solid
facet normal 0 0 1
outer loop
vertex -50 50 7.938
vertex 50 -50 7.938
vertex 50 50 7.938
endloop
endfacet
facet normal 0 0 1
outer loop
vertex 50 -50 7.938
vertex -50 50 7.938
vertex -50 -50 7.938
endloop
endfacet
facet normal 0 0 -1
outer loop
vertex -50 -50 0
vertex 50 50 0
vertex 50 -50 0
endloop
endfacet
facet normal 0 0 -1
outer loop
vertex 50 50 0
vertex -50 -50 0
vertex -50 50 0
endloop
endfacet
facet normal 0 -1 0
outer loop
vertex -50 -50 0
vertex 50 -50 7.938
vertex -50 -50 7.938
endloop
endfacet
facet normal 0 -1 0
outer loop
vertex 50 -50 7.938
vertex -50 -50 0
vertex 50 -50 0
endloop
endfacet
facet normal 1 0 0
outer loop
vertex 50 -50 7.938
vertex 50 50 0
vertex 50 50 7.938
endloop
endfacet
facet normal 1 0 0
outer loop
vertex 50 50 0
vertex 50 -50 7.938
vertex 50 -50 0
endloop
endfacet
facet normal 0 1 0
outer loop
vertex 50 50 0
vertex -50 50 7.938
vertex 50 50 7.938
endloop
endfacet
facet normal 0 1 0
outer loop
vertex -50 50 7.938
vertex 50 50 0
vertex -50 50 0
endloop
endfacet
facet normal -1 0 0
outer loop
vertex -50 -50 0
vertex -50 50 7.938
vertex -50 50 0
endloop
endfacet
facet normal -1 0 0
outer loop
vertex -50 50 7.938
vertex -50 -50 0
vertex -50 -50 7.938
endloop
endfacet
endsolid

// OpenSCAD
// Sheet parameters (mm)
sheet_L = 100;                 // length
sheet_W = 100;                 // width
sheet_T = 25.4 * 5/16;         // thickness (~5/16" = 0.3125" = 7.9375 mm)

// Render quality
$fn = 64;

// Geometry: one connected solid plate, placed on Z=0 for clear thickness in side views
module sheet_plate(L, W, T) {
    color([0.85, 0.85, 0.8])
        translate([0, 0, T/2])
            cube([L, W, T], center=true);
}

// Final output
sheet_plate(sheet_L, sheet_W, sheet_T);
